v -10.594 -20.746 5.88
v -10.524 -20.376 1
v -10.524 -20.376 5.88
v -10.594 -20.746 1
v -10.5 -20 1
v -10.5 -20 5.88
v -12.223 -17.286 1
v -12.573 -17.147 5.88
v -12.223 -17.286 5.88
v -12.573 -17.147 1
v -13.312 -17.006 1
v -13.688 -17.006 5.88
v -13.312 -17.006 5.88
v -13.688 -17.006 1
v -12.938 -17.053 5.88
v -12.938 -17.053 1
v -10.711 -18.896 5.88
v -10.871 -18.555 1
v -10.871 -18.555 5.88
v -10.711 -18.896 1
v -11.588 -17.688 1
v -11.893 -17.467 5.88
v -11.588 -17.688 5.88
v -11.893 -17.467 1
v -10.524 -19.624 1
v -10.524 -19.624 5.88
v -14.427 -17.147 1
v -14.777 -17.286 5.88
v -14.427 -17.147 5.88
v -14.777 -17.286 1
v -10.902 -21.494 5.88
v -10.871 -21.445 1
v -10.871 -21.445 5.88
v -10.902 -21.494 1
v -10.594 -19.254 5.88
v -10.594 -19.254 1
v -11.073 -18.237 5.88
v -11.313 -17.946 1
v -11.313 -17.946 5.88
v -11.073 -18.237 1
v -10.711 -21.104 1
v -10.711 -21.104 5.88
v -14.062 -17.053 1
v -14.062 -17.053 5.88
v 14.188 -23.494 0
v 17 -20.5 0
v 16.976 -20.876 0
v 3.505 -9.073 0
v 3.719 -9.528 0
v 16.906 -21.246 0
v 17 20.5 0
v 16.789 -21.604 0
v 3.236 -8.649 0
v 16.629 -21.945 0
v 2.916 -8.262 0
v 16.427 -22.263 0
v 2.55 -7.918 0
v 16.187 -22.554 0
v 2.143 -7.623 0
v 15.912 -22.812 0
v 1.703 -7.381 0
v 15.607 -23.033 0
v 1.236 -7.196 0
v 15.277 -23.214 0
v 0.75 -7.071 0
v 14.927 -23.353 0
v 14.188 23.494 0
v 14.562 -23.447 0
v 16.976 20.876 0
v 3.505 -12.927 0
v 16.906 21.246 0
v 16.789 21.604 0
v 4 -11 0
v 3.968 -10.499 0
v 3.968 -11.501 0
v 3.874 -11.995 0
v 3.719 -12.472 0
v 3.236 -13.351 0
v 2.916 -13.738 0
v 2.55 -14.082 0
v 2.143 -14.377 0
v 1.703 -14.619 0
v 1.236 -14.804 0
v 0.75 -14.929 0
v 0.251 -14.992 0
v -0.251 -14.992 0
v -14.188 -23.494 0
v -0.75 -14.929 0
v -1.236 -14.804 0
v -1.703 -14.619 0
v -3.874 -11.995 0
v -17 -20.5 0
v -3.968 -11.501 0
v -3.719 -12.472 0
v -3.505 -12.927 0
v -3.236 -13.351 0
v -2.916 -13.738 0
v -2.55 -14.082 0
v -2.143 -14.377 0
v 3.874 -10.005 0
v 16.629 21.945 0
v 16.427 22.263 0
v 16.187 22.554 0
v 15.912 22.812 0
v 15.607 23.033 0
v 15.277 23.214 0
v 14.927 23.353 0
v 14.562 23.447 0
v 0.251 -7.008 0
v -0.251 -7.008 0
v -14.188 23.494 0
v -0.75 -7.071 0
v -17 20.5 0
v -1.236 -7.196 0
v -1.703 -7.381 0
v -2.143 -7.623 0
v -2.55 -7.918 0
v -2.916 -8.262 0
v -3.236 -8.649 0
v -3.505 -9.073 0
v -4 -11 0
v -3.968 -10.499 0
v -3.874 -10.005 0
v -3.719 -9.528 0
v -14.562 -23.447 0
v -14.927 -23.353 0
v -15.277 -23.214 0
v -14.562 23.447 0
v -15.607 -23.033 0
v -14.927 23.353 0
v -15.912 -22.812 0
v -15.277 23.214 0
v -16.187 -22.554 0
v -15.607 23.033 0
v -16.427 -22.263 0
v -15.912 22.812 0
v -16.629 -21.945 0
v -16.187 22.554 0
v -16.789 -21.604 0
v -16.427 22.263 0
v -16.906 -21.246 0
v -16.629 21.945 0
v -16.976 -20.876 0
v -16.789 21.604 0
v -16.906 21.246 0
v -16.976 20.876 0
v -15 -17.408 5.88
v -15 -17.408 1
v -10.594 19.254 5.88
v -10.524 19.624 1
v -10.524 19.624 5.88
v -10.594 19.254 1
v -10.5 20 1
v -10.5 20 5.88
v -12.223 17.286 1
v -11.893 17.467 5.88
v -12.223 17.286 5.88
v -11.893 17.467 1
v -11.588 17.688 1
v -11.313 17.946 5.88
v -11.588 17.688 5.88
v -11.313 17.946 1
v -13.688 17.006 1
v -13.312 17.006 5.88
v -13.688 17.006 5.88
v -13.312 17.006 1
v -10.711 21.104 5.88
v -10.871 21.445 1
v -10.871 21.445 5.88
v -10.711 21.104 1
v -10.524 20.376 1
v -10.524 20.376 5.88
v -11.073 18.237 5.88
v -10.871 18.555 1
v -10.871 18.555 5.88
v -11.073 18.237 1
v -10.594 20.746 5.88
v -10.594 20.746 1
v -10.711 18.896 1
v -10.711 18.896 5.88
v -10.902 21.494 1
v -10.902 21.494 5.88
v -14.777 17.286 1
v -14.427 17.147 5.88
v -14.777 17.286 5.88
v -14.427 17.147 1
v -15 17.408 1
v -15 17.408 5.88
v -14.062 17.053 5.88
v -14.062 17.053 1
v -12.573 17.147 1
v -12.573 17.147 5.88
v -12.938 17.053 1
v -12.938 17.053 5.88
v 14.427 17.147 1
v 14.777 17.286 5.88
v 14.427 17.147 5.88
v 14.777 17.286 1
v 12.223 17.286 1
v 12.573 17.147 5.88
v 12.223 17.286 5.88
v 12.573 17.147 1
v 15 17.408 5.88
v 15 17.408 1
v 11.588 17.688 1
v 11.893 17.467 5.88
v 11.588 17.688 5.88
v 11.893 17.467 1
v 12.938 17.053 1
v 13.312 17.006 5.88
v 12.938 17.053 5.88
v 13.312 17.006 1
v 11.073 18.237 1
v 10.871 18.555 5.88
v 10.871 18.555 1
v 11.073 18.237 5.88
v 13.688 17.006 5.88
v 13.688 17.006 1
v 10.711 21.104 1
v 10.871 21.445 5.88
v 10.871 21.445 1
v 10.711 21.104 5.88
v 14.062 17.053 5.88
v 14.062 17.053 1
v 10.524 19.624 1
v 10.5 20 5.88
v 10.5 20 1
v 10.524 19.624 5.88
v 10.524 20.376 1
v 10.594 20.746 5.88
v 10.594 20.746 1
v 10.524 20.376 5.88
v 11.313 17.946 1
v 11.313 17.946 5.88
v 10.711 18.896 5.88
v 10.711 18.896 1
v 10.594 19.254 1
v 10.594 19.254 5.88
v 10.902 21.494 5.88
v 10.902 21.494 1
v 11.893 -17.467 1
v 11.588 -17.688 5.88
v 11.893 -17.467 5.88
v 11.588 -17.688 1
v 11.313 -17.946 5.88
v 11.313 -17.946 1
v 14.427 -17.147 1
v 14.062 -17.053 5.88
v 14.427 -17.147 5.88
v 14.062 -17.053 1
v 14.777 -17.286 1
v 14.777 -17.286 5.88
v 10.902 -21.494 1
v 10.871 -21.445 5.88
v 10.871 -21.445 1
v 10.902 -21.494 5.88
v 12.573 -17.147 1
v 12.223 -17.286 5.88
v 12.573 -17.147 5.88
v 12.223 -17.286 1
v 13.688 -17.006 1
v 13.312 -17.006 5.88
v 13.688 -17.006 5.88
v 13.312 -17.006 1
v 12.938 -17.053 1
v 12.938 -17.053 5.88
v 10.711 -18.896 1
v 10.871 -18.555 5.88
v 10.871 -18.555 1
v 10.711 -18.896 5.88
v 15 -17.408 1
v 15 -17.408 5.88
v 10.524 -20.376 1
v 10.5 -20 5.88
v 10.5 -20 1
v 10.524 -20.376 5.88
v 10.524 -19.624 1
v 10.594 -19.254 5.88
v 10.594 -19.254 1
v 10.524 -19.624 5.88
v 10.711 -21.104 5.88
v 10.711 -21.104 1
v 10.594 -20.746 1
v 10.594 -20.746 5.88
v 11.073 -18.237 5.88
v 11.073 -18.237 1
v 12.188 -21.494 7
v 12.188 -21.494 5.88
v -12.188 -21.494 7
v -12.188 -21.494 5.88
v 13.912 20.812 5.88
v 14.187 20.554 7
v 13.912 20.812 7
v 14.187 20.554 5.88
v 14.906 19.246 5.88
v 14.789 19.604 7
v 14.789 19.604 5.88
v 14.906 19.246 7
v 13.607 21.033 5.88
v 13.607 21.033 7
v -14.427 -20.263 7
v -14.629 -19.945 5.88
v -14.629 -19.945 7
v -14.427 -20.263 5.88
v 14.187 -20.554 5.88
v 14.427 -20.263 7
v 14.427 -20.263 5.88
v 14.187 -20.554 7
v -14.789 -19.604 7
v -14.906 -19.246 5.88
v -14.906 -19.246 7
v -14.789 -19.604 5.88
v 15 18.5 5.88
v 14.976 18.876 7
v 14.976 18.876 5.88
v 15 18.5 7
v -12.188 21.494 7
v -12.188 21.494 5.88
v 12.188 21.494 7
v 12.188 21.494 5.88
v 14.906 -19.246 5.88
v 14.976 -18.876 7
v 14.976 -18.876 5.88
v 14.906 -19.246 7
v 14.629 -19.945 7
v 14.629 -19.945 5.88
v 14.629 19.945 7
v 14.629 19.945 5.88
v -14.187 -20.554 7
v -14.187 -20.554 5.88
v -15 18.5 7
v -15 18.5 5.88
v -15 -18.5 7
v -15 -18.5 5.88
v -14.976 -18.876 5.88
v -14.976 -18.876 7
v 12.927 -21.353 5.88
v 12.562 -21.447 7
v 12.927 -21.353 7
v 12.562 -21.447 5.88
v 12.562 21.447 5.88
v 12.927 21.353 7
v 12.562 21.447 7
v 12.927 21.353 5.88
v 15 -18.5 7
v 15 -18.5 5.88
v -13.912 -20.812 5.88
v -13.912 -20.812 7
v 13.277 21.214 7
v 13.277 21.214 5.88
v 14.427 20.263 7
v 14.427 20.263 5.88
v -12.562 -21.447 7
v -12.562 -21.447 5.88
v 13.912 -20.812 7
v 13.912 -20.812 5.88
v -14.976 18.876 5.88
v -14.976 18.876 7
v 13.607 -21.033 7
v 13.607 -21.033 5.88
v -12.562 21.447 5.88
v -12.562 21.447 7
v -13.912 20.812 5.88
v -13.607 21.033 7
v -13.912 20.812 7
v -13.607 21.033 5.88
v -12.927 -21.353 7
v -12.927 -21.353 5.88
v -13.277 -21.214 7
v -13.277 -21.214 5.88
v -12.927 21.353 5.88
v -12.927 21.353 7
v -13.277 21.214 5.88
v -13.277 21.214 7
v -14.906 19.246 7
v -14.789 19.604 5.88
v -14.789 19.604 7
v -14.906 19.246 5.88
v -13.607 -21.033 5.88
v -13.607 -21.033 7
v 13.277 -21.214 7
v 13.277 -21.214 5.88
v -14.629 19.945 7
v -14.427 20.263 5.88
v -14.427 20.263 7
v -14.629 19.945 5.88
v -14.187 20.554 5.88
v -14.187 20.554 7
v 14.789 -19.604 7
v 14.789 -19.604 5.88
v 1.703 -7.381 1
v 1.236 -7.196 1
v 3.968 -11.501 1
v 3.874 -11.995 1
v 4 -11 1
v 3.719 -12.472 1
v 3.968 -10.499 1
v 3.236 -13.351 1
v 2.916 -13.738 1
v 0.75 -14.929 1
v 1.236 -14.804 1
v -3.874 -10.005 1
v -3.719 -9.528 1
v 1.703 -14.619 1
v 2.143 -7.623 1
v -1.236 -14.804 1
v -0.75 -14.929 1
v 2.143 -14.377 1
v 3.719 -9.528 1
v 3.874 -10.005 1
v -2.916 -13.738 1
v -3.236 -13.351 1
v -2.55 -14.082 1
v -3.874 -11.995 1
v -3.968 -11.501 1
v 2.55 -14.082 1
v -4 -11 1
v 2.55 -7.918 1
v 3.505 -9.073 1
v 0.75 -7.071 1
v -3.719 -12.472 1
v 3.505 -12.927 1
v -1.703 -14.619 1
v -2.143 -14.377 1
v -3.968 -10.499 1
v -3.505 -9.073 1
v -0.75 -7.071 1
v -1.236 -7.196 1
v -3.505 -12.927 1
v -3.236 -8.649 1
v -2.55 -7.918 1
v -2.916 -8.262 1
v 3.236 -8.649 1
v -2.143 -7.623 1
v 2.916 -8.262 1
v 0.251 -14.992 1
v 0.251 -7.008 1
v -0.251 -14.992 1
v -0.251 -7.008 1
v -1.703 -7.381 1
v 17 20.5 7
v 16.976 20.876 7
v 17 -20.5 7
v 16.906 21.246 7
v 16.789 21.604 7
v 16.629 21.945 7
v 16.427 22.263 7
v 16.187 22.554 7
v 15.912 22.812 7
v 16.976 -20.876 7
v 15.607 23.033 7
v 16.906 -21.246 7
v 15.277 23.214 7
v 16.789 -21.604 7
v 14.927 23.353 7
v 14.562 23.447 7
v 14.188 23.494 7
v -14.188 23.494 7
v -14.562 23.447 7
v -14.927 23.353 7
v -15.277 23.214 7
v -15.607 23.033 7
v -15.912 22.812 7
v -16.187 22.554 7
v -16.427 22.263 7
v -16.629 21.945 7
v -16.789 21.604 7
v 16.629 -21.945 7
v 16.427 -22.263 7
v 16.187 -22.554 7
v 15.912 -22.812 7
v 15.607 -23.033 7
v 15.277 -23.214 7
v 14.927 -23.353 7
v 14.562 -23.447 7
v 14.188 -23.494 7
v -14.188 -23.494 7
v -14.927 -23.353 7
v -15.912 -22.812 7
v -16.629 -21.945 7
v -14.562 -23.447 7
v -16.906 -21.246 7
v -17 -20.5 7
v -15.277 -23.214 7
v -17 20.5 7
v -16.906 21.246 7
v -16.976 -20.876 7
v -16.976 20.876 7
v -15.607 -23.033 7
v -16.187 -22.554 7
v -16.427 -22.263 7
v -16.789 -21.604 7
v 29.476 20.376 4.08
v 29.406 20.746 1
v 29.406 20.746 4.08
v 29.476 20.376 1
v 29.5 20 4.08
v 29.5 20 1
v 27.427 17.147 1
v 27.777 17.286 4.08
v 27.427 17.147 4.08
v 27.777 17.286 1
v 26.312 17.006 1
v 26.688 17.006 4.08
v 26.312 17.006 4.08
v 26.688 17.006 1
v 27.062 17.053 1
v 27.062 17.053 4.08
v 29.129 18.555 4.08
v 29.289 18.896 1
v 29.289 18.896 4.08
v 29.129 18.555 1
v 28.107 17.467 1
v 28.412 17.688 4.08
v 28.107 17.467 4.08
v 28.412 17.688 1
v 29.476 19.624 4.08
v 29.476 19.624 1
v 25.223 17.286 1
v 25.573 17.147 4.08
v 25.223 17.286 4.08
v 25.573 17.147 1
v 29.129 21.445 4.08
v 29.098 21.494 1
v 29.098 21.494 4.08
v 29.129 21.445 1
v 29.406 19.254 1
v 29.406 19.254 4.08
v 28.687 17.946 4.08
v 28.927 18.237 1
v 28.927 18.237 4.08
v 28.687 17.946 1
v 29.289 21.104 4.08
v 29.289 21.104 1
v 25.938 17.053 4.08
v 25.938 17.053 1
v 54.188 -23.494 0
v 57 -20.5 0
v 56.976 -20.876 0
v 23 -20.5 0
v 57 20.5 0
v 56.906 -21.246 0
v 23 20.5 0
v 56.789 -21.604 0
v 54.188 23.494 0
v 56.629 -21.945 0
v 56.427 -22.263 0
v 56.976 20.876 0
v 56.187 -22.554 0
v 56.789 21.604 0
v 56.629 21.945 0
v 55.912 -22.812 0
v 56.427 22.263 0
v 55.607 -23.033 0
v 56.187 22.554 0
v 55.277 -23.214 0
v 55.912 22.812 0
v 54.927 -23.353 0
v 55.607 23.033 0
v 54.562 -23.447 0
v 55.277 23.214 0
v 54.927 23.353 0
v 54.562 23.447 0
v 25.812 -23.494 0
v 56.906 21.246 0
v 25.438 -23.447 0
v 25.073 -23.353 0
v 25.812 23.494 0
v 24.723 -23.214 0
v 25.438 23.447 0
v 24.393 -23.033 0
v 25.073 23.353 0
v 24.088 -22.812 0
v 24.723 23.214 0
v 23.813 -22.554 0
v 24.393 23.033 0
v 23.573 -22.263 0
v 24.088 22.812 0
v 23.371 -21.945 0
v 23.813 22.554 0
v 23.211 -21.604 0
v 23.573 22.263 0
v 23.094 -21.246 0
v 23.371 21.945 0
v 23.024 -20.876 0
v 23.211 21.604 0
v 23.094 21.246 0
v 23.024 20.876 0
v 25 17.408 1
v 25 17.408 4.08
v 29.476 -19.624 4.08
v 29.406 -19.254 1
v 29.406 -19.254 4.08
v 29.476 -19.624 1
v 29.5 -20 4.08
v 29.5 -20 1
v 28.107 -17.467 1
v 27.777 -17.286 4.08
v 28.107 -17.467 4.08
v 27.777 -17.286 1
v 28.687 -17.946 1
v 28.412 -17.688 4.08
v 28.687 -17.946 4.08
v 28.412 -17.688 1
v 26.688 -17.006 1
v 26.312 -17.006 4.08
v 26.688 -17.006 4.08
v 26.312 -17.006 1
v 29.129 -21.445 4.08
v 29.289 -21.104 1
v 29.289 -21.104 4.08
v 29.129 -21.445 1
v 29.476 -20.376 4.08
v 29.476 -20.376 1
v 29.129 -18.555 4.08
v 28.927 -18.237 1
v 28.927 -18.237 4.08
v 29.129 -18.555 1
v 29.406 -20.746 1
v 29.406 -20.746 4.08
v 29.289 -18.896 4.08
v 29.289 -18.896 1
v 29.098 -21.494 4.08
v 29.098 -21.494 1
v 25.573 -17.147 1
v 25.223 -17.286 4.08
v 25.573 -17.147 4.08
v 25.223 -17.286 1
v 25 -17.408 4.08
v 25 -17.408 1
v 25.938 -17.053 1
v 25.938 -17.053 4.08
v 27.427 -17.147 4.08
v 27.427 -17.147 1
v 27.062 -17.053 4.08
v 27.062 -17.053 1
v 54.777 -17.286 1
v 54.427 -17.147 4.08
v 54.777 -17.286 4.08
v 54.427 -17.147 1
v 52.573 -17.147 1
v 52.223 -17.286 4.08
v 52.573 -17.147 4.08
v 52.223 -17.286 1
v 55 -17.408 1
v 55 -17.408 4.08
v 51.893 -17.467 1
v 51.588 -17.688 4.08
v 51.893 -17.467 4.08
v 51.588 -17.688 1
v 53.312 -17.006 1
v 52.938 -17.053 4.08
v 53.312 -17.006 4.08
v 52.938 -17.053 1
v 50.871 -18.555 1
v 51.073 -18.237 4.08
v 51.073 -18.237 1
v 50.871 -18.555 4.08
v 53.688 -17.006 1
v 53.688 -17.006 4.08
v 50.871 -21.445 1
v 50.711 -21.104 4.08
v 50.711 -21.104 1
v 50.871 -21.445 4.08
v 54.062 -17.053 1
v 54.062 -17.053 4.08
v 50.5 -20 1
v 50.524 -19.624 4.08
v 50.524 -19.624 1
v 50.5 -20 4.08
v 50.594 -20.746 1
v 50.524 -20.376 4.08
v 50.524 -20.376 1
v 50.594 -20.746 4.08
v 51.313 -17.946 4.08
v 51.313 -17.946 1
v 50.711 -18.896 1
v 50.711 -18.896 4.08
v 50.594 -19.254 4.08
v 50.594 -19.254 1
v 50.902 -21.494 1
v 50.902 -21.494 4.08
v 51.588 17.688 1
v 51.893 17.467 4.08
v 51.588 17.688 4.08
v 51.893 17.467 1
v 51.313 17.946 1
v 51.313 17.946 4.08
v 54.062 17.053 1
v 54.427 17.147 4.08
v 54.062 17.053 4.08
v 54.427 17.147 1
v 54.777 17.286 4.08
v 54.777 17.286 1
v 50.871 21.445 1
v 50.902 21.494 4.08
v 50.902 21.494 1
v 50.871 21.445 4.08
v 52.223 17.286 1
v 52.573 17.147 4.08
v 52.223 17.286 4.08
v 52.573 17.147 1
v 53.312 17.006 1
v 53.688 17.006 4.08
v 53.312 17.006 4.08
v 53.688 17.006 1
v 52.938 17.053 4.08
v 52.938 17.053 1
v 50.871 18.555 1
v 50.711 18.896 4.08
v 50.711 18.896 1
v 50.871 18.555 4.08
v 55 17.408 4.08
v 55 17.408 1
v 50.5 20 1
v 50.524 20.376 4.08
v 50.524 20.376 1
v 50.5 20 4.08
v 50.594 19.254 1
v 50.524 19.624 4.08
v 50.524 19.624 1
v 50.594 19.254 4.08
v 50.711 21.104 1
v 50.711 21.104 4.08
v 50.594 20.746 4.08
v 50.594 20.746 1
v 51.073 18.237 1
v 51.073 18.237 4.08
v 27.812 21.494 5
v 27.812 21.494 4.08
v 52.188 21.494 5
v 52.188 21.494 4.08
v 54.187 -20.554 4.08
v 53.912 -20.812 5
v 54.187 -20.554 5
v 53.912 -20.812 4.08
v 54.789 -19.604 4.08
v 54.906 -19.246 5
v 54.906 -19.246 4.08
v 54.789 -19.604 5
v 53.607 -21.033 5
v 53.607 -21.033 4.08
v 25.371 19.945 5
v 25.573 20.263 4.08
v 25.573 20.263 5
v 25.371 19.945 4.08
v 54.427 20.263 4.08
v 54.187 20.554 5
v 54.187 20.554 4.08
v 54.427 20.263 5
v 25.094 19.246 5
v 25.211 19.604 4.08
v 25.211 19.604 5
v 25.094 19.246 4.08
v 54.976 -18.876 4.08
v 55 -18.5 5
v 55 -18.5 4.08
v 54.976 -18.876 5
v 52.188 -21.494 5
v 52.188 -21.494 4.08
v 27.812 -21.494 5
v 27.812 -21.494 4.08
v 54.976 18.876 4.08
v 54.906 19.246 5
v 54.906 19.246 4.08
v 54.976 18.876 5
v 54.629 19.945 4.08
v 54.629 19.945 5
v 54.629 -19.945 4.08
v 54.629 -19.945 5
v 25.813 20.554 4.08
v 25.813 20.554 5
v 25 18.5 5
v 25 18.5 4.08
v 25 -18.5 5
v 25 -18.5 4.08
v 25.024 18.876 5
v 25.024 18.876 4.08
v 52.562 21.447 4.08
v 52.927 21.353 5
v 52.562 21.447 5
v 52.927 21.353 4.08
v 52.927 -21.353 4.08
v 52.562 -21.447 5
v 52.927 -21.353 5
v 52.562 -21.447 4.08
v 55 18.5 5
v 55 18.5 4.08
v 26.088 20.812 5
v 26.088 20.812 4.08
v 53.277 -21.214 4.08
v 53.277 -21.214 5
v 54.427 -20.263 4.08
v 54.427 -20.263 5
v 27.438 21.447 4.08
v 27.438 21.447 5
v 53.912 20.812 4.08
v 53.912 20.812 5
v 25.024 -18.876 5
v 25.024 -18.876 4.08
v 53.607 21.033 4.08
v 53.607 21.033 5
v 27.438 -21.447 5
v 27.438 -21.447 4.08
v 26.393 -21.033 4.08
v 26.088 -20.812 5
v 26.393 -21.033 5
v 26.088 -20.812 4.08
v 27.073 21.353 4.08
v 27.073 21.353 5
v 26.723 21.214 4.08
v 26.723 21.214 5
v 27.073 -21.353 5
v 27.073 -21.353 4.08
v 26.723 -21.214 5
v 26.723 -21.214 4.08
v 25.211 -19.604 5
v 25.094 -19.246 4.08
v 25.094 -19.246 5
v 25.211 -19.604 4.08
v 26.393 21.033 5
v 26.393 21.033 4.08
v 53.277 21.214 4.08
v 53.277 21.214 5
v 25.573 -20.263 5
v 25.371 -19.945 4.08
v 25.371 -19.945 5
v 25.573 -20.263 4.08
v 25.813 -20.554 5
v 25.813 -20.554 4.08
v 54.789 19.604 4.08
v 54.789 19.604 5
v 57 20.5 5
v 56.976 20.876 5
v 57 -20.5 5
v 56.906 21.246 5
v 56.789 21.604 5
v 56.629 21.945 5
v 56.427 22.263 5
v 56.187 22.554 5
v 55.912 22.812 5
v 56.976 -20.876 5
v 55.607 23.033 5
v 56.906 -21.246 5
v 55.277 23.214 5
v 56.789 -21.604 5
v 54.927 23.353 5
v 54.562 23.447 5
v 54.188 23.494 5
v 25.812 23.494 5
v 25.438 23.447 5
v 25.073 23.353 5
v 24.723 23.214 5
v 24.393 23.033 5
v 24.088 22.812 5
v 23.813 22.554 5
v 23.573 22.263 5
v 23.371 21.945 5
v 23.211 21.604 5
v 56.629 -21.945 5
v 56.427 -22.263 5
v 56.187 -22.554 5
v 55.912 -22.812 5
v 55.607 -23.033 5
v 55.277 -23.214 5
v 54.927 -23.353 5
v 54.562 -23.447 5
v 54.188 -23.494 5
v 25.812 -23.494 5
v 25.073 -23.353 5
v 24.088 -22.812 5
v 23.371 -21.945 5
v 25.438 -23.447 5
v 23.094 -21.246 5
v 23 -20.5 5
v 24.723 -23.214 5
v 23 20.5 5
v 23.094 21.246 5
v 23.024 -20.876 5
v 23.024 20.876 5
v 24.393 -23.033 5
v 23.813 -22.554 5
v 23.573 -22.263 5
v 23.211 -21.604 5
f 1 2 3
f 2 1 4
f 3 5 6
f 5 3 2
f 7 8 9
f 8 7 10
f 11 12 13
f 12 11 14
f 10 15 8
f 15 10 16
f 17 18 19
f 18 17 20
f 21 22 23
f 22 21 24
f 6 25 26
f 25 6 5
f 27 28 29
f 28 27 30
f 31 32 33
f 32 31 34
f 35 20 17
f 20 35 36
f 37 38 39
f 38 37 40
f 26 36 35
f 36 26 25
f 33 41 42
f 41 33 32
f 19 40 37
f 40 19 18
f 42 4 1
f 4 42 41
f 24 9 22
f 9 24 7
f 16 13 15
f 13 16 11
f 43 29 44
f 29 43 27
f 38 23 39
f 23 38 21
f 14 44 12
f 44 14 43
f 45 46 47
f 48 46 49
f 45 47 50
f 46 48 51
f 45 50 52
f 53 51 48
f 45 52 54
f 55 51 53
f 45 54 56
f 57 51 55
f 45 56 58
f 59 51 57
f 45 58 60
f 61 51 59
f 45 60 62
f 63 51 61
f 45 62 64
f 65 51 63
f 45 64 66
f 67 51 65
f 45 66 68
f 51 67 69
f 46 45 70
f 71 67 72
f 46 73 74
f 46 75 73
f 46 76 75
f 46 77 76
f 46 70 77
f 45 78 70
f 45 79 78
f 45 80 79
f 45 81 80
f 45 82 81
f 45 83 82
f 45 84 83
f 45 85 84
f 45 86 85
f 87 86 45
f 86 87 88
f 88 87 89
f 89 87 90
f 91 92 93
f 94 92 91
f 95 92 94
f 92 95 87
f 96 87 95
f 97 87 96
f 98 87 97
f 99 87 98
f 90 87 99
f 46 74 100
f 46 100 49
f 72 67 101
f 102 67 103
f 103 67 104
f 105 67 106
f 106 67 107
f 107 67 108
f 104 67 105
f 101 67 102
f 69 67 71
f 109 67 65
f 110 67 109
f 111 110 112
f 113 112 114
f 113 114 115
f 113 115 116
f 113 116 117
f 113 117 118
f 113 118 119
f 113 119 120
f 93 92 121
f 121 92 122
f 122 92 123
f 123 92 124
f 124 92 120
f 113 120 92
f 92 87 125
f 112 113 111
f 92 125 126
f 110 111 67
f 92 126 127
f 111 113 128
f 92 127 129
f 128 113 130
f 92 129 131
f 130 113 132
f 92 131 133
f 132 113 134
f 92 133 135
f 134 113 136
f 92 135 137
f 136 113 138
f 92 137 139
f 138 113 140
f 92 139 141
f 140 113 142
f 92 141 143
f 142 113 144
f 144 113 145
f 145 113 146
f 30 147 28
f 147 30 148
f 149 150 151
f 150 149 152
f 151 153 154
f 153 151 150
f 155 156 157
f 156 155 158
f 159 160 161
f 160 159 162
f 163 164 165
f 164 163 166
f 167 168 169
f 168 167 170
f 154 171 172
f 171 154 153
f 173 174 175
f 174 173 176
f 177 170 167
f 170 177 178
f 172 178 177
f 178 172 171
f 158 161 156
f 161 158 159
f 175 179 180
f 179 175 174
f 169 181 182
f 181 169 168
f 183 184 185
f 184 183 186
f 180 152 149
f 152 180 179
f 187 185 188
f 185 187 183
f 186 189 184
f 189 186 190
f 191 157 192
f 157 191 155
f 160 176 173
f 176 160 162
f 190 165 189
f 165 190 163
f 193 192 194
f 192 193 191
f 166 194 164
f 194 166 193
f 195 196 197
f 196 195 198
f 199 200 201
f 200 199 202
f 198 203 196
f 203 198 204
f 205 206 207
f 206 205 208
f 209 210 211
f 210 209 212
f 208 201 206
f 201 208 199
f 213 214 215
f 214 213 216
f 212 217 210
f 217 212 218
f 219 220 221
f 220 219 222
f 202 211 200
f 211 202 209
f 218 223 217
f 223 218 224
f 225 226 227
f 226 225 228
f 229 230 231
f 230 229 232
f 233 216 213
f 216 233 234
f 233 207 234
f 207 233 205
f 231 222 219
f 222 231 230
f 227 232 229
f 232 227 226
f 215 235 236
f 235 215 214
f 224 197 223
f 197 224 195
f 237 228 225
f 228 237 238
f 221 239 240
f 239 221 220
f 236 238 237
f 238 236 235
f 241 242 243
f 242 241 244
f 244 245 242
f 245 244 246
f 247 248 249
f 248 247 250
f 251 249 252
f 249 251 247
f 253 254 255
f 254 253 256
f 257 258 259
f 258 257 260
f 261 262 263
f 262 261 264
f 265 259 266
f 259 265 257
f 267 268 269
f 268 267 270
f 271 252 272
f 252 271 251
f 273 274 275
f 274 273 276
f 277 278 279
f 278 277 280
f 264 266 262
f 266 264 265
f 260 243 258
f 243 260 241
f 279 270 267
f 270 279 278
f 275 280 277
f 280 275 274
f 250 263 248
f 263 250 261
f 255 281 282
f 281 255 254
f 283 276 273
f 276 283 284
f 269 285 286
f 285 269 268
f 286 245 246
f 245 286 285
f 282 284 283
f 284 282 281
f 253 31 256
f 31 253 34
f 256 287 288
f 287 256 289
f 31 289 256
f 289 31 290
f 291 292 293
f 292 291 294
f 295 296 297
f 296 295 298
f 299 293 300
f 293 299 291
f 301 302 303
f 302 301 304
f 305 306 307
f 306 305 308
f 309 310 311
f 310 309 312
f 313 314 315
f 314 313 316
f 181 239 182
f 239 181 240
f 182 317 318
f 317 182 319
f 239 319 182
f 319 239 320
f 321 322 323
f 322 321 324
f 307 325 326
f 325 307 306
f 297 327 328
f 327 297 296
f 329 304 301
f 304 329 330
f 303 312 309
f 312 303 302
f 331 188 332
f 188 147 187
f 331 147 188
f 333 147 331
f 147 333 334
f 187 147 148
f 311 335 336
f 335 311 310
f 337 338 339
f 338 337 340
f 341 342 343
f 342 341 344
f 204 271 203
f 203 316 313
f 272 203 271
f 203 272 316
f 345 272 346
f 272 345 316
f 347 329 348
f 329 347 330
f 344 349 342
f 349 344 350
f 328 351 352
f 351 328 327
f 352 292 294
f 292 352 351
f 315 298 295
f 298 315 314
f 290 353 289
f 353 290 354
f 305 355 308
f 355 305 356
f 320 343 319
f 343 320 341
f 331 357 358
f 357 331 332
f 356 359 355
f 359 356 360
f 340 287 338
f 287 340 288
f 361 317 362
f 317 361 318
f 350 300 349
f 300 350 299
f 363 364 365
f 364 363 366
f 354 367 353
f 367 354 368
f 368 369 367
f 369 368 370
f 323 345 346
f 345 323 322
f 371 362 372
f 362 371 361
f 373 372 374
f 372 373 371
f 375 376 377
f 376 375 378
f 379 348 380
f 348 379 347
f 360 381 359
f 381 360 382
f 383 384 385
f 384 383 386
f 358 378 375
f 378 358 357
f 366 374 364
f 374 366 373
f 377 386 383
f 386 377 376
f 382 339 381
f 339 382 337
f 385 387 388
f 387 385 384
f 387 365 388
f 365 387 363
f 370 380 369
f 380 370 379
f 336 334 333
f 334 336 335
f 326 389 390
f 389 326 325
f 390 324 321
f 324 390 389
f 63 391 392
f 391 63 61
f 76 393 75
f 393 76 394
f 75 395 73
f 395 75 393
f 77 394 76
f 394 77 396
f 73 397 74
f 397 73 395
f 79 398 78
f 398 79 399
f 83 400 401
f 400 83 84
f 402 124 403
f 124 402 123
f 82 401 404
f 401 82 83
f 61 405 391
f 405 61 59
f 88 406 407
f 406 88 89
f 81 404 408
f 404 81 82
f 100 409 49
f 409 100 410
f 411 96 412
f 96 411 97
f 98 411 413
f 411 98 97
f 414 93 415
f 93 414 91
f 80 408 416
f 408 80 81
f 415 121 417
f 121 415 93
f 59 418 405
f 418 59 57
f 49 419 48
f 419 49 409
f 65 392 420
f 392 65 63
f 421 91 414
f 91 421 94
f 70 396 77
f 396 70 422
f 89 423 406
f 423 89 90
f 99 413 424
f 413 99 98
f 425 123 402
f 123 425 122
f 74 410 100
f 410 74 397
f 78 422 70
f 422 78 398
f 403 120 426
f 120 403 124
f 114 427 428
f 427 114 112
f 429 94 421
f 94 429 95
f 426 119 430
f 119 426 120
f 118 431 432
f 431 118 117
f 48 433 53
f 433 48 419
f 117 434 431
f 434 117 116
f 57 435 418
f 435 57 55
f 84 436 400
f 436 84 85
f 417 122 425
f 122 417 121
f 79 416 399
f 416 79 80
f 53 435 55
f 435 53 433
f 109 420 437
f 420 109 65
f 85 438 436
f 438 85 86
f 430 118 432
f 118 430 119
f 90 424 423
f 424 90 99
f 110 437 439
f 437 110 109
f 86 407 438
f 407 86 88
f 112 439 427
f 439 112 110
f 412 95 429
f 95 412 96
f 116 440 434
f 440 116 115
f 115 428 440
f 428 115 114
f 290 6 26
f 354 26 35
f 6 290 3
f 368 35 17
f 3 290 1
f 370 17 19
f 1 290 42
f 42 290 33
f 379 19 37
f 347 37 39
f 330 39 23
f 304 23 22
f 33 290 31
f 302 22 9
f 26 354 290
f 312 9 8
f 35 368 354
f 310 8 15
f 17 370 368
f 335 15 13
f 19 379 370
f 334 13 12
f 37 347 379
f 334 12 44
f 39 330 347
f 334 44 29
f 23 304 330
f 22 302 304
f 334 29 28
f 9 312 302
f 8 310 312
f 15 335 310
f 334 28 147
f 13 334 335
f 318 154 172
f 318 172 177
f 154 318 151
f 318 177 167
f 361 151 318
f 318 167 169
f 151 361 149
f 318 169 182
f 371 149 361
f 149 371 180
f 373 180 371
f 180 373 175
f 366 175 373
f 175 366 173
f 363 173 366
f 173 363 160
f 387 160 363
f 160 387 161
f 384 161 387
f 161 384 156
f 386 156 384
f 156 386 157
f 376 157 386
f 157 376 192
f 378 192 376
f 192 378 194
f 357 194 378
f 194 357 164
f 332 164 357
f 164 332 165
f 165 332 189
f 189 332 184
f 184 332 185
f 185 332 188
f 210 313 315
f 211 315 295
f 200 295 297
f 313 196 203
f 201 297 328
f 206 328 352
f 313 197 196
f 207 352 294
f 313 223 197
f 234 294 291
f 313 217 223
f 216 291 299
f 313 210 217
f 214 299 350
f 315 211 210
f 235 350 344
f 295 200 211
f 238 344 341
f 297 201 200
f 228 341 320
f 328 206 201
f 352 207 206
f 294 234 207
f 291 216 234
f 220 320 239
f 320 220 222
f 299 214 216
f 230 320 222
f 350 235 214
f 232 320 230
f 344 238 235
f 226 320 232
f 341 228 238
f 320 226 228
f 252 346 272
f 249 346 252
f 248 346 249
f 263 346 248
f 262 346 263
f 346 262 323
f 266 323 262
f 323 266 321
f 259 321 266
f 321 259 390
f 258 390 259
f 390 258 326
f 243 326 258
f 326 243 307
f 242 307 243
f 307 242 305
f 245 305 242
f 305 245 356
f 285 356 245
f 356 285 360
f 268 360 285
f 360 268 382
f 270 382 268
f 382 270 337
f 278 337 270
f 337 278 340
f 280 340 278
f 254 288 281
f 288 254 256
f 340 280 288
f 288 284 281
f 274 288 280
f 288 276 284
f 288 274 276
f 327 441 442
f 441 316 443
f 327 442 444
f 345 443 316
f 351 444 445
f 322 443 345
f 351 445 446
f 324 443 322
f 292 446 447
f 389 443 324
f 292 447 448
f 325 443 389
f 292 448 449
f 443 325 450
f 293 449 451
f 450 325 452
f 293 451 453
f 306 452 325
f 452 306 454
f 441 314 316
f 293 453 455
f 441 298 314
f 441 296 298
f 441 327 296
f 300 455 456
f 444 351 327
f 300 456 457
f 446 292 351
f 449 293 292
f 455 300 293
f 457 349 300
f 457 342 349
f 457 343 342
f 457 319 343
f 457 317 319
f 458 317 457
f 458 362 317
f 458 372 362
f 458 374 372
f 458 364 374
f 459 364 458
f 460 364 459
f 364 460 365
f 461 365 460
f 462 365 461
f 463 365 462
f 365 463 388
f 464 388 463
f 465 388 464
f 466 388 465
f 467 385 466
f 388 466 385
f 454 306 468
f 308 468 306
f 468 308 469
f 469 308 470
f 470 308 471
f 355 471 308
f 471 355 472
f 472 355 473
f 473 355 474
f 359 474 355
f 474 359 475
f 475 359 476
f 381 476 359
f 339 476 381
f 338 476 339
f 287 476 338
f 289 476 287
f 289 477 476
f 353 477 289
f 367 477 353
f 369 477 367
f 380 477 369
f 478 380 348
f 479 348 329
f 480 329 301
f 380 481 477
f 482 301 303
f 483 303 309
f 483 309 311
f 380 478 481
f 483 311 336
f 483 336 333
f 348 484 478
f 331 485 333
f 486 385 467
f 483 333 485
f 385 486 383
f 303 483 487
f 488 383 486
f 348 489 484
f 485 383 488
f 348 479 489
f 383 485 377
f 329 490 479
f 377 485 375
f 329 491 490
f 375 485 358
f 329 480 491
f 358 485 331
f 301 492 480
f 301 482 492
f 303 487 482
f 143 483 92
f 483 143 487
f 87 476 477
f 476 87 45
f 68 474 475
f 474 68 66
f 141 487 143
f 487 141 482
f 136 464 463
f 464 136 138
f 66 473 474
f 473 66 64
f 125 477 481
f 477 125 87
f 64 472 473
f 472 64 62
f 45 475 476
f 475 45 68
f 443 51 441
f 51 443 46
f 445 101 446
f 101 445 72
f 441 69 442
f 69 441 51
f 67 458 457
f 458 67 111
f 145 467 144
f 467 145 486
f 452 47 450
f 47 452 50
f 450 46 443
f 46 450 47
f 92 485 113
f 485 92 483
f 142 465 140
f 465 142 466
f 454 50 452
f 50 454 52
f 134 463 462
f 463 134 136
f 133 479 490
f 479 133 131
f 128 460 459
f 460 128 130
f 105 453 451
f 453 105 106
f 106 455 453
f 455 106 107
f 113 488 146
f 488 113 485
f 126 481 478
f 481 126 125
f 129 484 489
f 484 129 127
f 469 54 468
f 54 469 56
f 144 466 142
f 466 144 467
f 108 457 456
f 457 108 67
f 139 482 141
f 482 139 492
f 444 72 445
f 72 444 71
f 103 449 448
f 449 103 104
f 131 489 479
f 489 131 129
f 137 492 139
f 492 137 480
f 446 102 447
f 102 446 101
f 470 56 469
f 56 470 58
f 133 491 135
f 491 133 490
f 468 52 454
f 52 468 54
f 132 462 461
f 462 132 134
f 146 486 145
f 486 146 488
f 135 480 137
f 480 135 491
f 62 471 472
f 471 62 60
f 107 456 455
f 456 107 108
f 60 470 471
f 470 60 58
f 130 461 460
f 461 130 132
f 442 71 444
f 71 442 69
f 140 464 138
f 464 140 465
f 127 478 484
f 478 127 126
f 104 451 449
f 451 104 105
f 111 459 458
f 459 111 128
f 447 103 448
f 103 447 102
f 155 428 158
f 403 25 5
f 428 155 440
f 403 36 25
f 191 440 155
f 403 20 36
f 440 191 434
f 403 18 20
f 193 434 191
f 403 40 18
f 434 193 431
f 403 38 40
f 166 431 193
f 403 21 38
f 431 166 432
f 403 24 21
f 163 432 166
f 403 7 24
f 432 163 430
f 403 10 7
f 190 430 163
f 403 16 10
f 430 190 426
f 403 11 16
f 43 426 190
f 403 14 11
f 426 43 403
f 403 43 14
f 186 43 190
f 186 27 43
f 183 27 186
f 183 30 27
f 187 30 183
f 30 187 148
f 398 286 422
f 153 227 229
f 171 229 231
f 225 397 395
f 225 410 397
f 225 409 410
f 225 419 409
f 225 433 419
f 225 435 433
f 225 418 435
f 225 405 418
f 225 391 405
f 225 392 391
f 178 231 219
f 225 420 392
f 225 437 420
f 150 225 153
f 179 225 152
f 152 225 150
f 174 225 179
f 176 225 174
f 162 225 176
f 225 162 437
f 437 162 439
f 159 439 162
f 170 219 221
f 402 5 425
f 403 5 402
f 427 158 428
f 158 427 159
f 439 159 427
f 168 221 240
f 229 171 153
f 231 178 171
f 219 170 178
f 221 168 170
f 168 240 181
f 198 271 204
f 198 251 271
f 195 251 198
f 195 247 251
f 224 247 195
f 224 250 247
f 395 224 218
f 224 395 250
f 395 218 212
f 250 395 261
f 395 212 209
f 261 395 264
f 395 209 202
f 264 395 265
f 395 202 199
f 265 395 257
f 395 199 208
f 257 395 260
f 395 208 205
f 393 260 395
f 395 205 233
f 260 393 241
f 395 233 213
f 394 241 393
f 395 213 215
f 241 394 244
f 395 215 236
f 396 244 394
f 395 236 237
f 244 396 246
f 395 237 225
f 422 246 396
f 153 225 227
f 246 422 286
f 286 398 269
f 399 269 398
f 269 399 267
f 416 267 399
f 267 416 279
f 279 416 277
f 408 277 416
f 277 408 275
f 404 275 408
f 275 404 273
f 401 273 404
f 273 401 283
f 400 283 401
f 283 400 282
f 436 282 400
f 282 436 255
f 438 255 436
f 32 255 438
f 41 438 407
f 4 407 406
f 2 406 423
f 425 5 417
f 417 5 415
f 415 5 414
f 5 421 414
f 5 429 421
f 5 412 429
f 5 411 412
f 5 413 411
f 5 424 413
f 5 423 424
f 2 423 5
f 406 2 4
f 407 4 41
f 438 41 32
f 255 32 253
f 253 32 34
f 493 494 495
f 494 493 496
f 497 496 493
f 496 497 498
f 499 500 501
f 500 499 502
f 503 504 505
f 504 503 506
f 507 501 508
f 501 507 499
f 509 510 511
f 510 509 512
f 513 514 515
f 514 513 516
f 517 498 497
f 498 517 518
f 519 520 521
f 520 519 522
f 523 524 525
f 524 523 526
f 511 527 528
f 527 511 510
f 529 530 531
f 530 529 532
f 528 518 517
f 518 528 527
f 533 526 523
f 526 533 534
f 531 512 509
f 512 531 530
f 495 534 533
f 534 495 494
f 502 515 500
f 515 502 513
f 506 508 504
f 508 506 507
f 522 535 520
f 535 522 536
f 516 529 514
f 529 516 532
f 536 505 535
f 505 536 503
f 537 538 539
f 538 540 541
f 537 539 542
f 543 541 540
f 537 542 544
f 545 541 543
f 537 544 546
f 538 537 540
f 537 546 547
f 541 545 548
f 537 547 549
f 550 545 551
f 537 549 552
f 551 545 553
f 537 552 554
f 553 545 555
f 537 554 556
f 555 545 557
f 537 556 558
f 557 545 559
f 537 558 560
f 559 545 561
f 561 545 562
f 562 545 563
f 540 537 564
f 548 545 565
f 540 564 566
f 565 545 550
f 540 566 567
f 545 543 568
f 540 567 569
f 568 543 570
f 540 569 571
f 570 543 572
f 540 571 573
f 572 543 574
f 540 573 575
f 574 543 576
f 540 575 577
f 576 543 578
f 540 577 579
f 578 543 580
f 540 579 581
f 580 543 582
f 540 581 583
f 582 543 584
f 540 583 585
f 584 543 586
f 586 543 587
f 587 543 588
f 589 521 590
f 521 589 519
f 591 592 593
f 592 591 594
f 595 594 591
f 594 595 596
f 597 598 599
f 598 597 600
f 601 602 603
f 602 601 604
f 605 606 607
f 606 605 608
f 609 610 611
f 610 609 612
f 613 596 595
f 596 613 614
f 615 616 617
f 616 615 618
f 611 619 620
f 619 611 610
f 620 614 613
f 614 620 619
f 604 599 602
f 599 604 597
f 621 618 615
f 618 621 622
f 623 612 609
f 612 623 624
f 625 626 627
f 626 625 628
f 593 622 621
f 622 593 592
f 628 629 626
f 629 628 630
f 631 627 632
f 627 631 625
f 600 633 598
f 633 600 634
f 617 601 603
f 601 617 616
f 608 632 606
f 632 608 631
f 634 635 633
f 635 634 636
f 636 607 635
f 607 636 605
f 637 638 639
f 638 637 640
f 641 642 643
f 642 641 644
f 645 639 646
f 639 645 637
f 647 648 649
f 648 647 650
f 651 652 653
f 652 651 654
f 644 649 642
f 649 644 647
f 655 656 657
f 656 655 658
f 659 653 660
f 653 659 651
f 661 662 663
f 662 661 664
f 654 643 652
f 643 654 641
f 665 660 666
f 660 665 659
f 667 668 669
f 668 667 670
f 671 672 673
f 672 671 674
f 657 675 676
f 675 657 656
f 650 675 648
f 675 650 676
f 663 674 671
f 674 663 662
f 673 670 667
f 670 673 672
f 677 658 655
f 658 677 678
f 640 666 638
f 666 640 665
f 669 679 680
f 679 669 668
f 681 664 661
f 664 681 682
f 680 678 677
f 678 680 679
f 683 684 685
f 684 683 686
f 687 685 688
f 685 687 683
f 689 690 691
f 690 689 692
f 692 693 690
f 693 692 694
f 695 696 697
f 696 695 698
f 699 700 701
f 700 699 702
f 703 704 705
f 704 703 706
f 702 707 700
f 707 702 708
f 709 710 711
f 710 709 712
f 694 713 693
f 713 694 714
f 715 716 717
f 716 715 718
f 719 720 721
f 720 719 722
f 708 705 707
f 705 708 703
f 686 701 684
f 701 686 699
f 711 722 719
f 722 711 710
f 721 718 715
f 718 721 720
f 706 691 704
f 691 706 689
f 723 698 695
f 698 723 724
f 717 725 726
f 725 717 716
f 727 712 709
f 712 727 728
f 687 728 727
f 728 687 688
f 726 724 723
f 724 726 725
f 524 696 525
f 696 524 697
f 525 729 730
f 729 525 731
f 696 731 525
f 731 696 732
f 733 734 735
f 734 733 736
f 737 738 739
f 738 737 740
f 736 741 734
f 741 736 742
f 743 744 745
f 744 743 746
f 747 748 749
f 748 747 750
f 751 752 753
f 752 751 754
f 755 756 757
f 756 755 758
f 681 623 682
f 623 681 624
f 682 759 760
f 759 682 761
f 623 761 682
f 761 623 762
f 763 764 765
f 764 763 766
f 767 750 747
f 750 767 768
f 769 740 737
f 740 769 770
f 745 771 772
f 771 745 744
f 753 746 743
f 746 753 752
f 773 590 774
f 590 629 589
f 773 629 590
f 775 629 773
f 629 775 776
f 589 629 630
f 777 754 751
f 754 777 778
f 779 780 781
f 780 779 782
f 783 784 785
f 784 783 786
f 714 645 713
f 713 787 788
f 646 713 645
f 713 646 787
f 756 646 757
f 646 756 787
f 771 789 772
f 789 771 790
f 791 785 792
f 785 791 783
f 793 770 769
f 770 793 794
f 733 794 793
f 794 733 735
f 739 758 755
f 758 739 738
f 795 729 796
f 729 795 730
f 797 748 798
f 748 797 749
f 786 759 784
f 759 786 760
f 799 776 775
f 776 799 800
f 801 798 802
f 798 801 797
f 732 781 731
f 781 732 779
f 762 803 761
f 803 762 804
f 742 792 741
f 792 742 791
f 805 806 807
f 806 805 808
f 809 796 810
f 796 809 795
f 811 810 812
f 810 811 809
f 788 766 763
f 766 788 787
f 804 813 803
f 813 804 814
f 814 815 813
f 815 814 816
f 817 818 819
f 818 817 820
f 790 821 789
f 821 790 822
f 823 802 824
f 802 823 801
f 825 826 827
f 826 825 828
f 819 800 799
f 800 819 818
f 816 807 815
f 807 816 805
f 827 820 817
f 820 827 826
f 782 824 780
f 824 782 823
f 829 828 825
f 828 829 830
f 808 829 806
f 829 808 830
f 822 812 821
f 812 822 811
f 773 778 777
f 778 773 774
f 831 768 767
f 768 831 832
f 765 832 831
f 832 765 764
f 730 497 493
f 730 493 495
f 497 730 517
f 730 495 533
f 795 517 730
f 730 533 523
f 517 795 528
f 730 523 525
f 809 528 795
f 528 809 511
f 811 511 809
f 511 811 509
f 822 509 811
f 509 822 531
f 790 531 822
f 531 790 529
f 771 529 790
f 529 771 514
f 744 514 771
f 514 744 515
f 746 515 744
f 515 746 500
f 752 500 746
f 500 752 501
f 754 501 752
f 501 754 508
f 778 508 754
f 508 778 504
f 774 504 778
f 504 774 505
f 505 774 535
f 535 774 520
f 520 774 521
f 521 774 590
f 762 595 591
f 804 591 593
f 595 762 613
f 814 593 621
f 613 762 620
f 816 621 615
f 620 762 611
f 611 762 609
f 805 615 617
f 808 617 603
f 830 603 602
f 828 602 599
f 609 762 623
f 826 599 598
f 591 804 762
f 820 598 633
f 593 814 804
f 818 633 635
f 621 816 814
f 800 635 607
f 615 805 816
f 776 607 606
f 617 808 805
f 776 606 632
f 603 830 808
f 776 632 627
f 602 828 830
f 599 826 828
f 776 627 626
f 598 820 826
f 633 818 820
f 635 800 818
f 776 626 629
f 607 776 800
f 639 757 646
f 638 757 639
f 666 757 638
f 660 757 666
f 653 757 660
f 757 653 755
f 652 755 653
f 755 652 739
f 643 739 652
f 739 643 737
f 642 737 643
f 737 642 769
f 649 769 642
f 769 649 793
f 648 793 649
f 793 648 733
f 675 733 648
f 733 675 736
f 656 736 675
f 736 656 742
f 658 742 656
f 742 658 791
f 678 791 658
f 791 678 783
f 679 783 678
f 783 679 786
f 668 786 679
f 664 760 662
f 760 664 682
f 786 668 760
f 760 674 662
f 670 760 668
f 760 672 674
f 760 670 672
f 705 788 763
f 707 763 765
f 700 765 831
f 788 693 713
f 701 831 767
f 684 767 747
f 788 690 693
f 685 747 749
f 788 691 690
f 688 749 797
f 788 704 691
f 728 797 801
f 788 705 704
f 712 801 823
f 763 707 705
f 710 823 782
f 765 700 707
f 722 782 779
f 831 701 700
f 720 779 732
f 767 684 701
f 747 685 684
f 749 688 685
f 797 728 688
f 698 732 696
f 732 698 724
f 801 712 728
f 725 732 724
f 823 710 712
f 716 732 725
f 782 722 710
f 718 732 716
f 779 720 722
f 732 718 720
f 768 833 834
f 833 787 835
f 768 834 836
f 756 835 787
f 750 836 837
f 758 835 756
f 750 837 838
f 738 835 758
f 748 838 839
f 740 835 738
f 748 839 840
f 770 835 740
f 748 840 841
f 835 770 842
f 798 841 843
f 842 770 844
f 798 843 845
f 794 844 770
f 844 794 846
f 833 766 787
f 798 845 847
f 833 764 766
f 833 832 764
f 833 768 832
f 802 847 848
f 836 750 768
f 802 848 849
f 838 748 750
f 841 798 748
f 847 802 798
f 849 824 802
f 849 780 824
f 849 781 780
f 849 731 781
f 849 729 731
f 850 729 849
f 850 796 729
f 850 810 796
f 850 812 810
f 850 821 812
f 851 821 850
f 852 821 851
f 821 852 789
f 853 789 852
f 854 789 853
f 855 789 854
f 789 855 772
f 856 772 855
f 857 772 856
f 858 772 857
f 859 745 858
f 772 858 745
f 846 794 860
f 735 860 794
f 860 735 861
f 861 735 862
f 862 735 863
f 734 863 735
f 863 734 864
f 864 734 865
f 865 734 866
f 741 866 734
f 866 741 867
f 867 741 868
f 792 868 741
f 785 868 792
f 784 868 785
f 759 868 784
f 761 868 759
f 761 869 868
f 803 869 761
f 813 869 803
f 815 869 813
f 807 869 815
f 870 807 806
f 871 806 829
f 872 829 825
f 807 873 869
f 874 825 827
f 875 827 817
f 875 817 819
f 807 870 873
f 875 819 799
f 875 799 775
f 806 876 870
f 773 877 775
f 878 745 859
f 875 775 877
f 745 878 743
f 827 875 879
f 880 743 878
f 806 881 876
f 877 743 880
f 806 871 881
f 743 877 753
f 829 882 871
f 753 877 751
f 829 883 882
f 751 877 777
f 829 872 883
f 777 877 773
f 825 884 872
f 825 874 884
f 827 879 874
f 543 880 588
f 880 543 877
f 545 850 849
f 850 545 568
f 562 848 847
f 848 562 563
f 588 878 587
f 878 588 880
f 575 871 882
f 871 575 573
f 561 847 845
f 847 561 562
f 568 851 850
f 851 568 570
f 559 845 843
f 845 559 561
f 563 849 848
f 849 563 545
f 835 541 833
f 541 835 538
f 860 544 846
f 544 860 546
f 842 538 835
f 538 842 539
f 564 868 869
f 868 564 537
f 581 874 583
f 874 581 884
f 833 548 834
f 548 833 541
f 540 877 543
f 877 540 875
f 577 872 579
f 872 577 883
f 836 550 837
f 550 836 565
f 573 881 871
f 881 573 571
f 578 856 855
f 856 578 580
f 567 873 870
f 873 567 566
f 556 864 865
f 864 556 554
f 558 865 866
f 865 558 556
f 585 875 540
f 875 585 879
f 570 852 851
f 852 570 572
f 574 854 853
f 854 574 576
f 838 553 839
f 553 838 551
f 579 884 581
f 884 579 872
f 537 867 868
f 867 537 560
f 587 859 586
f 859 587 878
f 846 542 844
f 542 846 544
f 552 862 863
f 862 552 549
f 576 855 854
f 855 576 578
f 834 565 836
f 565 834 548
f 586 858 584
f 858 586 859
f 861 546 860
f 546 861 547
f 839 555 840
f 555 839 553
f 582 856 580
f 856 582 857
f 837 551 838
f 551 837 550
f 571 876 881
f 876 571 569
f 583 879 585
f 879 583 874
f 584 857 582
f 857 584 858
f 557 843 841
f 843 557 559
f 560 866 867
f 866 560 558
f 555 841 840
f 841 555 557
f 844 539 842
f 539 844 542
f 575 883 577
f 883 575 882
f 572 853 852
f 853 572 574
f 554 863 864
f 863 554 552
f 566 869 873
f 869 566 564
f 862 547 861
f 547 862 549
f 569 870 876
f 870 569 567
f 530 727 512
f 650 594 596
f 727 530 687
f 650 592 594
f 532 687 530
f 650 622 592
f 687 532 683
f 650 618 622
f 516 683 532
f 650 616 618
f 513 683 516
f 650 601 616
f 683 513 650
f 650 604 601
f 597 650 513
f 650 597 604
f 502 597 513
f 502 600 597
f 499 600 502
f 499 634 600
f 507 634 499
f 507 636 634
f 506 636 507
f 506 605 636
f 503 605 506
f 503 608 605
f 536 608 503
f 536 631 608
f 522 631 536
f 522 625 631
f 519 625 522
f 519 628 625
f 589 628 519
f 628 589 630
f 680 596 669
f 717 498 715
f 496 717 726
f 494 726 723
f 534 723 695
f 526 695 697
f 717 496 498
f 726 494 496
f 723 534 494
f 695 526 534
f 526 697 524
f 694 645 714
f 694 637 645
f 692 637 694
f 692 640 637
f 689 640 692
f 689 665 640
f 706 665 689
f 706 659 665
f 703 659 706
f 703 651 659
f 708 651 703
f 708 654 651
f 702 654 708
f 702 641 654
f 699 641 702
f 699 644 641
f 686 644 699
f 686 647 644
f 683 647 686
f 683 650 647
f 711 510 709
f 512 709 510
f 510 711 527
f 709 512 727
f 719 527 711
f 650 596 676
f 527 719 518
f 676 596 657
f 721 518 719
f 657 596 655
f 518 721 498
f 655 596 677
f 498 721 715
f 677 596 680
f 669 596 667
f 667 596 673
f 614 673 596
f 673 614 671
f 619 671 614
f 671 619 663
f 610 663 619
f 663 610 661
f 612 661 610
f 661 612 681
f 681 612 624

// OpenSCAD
$fn=50;


altcaja=12;
rotate([180,0,0]) translate([0,0,-altcaja]){
    difference(){ 
        postes();
        translate([0,0,-20]) cube(50,center=true);
        scale(1.02) esp32cam();
    }
    difference(){ 
        
        caja_exterior();
        caja_interior();
        translate([0,0,-20]) cube(50,center=true);
        esp32cam();
    }
}
//color("red") esp32cam();

translate([40,0,0]) {
    difference(){ 
        postes();
        translate([0,0,30]) cube(50,center=true);
        scale(1.02) esp32cam();
    }
    difference(){ 
        
        caja_exterior();
        caja_interior();
        translate([0,0,30]) cube(50,center=true);
        esp32cam();
    }
  
    
}
/////////////////////////////////////////////////////////////////

module caja_exterior(){
    hull(){
        chaflan=3;
        grosor=12;
        largo=31/2-chaflan/2;
        ancho=44/2-chaflan/2;
        
        translate([-largo,ancho,0]) cylinder(altcaja,chaflan,chaflan);
        translate([-largo,-ancho,0]) cylinder(altcaja,chaflan,chaflan);
        translate([largo,-ancho,0]) cylinder(altcaja,chaflan,chaflan);
        translate([largo,ancho,0]) cylinder(altcaja,chaflan,chaflan);
    } 

}

module caja_interior(){
    chaflan=3;
    grosor=altcaja-2;
    largo=27/2-chaflan/2;
    ancho=40/2-chaflan/2;
    hull(){

        
        translate([-largo,ancho,1]) cylinder(grosor,chaflan,chaflan);
        translate([-largo,-ancho,1]) cylinder(grosor,chaflan,chaflan);
        translate([largo,-ancho,1]) cylinder(grosor,chaflan,chaflan);
        translate([largo,ancho,1]) cylinder(grosor,chaflan,chaflan);
    } 

}
module postes(){
        chaflan=3;
        grosor=12;
        largo=30/2-chaflan/2;
        ancho=43/2-chaflan/2;  
    
    translate([-largo,ancho,0]) cylinder(grosor,chaflan,chaflan);
    translate([-largo,-ancho,0]) cylinder(grosor,chaflan,chaflan);
    translate([largo,-ancho,0]) cylinder(grosor,chaflan,chaflan);
    translate([largo,ancho,0]) cylinder(grosor,chaflan,chaflan);
}


module esp32cam(){
    translate([0,0,4]){
        hull(){
            chaflan=3;
            grosor=2;
            largo=27/2-chaflan/2;
            ancho=40/2-chaflan/2;
            
            translate([-largo,ancho,0]) cylinder(grosor,chaflan,chaflan);
            translate([-largo,-ancho,0]) cylinder(grosor,chaflan,chaflan);
            translate([largo,-ancho,0]) cylinder(grosor,chaflan,chaflan);
            translate([largo,ancho,0]) cylinder(grosor,chaflan,chaflan);
        } 
        //camara
        translate([0,11,0]) cylinder(9,8/2,8/2);
    }
}
